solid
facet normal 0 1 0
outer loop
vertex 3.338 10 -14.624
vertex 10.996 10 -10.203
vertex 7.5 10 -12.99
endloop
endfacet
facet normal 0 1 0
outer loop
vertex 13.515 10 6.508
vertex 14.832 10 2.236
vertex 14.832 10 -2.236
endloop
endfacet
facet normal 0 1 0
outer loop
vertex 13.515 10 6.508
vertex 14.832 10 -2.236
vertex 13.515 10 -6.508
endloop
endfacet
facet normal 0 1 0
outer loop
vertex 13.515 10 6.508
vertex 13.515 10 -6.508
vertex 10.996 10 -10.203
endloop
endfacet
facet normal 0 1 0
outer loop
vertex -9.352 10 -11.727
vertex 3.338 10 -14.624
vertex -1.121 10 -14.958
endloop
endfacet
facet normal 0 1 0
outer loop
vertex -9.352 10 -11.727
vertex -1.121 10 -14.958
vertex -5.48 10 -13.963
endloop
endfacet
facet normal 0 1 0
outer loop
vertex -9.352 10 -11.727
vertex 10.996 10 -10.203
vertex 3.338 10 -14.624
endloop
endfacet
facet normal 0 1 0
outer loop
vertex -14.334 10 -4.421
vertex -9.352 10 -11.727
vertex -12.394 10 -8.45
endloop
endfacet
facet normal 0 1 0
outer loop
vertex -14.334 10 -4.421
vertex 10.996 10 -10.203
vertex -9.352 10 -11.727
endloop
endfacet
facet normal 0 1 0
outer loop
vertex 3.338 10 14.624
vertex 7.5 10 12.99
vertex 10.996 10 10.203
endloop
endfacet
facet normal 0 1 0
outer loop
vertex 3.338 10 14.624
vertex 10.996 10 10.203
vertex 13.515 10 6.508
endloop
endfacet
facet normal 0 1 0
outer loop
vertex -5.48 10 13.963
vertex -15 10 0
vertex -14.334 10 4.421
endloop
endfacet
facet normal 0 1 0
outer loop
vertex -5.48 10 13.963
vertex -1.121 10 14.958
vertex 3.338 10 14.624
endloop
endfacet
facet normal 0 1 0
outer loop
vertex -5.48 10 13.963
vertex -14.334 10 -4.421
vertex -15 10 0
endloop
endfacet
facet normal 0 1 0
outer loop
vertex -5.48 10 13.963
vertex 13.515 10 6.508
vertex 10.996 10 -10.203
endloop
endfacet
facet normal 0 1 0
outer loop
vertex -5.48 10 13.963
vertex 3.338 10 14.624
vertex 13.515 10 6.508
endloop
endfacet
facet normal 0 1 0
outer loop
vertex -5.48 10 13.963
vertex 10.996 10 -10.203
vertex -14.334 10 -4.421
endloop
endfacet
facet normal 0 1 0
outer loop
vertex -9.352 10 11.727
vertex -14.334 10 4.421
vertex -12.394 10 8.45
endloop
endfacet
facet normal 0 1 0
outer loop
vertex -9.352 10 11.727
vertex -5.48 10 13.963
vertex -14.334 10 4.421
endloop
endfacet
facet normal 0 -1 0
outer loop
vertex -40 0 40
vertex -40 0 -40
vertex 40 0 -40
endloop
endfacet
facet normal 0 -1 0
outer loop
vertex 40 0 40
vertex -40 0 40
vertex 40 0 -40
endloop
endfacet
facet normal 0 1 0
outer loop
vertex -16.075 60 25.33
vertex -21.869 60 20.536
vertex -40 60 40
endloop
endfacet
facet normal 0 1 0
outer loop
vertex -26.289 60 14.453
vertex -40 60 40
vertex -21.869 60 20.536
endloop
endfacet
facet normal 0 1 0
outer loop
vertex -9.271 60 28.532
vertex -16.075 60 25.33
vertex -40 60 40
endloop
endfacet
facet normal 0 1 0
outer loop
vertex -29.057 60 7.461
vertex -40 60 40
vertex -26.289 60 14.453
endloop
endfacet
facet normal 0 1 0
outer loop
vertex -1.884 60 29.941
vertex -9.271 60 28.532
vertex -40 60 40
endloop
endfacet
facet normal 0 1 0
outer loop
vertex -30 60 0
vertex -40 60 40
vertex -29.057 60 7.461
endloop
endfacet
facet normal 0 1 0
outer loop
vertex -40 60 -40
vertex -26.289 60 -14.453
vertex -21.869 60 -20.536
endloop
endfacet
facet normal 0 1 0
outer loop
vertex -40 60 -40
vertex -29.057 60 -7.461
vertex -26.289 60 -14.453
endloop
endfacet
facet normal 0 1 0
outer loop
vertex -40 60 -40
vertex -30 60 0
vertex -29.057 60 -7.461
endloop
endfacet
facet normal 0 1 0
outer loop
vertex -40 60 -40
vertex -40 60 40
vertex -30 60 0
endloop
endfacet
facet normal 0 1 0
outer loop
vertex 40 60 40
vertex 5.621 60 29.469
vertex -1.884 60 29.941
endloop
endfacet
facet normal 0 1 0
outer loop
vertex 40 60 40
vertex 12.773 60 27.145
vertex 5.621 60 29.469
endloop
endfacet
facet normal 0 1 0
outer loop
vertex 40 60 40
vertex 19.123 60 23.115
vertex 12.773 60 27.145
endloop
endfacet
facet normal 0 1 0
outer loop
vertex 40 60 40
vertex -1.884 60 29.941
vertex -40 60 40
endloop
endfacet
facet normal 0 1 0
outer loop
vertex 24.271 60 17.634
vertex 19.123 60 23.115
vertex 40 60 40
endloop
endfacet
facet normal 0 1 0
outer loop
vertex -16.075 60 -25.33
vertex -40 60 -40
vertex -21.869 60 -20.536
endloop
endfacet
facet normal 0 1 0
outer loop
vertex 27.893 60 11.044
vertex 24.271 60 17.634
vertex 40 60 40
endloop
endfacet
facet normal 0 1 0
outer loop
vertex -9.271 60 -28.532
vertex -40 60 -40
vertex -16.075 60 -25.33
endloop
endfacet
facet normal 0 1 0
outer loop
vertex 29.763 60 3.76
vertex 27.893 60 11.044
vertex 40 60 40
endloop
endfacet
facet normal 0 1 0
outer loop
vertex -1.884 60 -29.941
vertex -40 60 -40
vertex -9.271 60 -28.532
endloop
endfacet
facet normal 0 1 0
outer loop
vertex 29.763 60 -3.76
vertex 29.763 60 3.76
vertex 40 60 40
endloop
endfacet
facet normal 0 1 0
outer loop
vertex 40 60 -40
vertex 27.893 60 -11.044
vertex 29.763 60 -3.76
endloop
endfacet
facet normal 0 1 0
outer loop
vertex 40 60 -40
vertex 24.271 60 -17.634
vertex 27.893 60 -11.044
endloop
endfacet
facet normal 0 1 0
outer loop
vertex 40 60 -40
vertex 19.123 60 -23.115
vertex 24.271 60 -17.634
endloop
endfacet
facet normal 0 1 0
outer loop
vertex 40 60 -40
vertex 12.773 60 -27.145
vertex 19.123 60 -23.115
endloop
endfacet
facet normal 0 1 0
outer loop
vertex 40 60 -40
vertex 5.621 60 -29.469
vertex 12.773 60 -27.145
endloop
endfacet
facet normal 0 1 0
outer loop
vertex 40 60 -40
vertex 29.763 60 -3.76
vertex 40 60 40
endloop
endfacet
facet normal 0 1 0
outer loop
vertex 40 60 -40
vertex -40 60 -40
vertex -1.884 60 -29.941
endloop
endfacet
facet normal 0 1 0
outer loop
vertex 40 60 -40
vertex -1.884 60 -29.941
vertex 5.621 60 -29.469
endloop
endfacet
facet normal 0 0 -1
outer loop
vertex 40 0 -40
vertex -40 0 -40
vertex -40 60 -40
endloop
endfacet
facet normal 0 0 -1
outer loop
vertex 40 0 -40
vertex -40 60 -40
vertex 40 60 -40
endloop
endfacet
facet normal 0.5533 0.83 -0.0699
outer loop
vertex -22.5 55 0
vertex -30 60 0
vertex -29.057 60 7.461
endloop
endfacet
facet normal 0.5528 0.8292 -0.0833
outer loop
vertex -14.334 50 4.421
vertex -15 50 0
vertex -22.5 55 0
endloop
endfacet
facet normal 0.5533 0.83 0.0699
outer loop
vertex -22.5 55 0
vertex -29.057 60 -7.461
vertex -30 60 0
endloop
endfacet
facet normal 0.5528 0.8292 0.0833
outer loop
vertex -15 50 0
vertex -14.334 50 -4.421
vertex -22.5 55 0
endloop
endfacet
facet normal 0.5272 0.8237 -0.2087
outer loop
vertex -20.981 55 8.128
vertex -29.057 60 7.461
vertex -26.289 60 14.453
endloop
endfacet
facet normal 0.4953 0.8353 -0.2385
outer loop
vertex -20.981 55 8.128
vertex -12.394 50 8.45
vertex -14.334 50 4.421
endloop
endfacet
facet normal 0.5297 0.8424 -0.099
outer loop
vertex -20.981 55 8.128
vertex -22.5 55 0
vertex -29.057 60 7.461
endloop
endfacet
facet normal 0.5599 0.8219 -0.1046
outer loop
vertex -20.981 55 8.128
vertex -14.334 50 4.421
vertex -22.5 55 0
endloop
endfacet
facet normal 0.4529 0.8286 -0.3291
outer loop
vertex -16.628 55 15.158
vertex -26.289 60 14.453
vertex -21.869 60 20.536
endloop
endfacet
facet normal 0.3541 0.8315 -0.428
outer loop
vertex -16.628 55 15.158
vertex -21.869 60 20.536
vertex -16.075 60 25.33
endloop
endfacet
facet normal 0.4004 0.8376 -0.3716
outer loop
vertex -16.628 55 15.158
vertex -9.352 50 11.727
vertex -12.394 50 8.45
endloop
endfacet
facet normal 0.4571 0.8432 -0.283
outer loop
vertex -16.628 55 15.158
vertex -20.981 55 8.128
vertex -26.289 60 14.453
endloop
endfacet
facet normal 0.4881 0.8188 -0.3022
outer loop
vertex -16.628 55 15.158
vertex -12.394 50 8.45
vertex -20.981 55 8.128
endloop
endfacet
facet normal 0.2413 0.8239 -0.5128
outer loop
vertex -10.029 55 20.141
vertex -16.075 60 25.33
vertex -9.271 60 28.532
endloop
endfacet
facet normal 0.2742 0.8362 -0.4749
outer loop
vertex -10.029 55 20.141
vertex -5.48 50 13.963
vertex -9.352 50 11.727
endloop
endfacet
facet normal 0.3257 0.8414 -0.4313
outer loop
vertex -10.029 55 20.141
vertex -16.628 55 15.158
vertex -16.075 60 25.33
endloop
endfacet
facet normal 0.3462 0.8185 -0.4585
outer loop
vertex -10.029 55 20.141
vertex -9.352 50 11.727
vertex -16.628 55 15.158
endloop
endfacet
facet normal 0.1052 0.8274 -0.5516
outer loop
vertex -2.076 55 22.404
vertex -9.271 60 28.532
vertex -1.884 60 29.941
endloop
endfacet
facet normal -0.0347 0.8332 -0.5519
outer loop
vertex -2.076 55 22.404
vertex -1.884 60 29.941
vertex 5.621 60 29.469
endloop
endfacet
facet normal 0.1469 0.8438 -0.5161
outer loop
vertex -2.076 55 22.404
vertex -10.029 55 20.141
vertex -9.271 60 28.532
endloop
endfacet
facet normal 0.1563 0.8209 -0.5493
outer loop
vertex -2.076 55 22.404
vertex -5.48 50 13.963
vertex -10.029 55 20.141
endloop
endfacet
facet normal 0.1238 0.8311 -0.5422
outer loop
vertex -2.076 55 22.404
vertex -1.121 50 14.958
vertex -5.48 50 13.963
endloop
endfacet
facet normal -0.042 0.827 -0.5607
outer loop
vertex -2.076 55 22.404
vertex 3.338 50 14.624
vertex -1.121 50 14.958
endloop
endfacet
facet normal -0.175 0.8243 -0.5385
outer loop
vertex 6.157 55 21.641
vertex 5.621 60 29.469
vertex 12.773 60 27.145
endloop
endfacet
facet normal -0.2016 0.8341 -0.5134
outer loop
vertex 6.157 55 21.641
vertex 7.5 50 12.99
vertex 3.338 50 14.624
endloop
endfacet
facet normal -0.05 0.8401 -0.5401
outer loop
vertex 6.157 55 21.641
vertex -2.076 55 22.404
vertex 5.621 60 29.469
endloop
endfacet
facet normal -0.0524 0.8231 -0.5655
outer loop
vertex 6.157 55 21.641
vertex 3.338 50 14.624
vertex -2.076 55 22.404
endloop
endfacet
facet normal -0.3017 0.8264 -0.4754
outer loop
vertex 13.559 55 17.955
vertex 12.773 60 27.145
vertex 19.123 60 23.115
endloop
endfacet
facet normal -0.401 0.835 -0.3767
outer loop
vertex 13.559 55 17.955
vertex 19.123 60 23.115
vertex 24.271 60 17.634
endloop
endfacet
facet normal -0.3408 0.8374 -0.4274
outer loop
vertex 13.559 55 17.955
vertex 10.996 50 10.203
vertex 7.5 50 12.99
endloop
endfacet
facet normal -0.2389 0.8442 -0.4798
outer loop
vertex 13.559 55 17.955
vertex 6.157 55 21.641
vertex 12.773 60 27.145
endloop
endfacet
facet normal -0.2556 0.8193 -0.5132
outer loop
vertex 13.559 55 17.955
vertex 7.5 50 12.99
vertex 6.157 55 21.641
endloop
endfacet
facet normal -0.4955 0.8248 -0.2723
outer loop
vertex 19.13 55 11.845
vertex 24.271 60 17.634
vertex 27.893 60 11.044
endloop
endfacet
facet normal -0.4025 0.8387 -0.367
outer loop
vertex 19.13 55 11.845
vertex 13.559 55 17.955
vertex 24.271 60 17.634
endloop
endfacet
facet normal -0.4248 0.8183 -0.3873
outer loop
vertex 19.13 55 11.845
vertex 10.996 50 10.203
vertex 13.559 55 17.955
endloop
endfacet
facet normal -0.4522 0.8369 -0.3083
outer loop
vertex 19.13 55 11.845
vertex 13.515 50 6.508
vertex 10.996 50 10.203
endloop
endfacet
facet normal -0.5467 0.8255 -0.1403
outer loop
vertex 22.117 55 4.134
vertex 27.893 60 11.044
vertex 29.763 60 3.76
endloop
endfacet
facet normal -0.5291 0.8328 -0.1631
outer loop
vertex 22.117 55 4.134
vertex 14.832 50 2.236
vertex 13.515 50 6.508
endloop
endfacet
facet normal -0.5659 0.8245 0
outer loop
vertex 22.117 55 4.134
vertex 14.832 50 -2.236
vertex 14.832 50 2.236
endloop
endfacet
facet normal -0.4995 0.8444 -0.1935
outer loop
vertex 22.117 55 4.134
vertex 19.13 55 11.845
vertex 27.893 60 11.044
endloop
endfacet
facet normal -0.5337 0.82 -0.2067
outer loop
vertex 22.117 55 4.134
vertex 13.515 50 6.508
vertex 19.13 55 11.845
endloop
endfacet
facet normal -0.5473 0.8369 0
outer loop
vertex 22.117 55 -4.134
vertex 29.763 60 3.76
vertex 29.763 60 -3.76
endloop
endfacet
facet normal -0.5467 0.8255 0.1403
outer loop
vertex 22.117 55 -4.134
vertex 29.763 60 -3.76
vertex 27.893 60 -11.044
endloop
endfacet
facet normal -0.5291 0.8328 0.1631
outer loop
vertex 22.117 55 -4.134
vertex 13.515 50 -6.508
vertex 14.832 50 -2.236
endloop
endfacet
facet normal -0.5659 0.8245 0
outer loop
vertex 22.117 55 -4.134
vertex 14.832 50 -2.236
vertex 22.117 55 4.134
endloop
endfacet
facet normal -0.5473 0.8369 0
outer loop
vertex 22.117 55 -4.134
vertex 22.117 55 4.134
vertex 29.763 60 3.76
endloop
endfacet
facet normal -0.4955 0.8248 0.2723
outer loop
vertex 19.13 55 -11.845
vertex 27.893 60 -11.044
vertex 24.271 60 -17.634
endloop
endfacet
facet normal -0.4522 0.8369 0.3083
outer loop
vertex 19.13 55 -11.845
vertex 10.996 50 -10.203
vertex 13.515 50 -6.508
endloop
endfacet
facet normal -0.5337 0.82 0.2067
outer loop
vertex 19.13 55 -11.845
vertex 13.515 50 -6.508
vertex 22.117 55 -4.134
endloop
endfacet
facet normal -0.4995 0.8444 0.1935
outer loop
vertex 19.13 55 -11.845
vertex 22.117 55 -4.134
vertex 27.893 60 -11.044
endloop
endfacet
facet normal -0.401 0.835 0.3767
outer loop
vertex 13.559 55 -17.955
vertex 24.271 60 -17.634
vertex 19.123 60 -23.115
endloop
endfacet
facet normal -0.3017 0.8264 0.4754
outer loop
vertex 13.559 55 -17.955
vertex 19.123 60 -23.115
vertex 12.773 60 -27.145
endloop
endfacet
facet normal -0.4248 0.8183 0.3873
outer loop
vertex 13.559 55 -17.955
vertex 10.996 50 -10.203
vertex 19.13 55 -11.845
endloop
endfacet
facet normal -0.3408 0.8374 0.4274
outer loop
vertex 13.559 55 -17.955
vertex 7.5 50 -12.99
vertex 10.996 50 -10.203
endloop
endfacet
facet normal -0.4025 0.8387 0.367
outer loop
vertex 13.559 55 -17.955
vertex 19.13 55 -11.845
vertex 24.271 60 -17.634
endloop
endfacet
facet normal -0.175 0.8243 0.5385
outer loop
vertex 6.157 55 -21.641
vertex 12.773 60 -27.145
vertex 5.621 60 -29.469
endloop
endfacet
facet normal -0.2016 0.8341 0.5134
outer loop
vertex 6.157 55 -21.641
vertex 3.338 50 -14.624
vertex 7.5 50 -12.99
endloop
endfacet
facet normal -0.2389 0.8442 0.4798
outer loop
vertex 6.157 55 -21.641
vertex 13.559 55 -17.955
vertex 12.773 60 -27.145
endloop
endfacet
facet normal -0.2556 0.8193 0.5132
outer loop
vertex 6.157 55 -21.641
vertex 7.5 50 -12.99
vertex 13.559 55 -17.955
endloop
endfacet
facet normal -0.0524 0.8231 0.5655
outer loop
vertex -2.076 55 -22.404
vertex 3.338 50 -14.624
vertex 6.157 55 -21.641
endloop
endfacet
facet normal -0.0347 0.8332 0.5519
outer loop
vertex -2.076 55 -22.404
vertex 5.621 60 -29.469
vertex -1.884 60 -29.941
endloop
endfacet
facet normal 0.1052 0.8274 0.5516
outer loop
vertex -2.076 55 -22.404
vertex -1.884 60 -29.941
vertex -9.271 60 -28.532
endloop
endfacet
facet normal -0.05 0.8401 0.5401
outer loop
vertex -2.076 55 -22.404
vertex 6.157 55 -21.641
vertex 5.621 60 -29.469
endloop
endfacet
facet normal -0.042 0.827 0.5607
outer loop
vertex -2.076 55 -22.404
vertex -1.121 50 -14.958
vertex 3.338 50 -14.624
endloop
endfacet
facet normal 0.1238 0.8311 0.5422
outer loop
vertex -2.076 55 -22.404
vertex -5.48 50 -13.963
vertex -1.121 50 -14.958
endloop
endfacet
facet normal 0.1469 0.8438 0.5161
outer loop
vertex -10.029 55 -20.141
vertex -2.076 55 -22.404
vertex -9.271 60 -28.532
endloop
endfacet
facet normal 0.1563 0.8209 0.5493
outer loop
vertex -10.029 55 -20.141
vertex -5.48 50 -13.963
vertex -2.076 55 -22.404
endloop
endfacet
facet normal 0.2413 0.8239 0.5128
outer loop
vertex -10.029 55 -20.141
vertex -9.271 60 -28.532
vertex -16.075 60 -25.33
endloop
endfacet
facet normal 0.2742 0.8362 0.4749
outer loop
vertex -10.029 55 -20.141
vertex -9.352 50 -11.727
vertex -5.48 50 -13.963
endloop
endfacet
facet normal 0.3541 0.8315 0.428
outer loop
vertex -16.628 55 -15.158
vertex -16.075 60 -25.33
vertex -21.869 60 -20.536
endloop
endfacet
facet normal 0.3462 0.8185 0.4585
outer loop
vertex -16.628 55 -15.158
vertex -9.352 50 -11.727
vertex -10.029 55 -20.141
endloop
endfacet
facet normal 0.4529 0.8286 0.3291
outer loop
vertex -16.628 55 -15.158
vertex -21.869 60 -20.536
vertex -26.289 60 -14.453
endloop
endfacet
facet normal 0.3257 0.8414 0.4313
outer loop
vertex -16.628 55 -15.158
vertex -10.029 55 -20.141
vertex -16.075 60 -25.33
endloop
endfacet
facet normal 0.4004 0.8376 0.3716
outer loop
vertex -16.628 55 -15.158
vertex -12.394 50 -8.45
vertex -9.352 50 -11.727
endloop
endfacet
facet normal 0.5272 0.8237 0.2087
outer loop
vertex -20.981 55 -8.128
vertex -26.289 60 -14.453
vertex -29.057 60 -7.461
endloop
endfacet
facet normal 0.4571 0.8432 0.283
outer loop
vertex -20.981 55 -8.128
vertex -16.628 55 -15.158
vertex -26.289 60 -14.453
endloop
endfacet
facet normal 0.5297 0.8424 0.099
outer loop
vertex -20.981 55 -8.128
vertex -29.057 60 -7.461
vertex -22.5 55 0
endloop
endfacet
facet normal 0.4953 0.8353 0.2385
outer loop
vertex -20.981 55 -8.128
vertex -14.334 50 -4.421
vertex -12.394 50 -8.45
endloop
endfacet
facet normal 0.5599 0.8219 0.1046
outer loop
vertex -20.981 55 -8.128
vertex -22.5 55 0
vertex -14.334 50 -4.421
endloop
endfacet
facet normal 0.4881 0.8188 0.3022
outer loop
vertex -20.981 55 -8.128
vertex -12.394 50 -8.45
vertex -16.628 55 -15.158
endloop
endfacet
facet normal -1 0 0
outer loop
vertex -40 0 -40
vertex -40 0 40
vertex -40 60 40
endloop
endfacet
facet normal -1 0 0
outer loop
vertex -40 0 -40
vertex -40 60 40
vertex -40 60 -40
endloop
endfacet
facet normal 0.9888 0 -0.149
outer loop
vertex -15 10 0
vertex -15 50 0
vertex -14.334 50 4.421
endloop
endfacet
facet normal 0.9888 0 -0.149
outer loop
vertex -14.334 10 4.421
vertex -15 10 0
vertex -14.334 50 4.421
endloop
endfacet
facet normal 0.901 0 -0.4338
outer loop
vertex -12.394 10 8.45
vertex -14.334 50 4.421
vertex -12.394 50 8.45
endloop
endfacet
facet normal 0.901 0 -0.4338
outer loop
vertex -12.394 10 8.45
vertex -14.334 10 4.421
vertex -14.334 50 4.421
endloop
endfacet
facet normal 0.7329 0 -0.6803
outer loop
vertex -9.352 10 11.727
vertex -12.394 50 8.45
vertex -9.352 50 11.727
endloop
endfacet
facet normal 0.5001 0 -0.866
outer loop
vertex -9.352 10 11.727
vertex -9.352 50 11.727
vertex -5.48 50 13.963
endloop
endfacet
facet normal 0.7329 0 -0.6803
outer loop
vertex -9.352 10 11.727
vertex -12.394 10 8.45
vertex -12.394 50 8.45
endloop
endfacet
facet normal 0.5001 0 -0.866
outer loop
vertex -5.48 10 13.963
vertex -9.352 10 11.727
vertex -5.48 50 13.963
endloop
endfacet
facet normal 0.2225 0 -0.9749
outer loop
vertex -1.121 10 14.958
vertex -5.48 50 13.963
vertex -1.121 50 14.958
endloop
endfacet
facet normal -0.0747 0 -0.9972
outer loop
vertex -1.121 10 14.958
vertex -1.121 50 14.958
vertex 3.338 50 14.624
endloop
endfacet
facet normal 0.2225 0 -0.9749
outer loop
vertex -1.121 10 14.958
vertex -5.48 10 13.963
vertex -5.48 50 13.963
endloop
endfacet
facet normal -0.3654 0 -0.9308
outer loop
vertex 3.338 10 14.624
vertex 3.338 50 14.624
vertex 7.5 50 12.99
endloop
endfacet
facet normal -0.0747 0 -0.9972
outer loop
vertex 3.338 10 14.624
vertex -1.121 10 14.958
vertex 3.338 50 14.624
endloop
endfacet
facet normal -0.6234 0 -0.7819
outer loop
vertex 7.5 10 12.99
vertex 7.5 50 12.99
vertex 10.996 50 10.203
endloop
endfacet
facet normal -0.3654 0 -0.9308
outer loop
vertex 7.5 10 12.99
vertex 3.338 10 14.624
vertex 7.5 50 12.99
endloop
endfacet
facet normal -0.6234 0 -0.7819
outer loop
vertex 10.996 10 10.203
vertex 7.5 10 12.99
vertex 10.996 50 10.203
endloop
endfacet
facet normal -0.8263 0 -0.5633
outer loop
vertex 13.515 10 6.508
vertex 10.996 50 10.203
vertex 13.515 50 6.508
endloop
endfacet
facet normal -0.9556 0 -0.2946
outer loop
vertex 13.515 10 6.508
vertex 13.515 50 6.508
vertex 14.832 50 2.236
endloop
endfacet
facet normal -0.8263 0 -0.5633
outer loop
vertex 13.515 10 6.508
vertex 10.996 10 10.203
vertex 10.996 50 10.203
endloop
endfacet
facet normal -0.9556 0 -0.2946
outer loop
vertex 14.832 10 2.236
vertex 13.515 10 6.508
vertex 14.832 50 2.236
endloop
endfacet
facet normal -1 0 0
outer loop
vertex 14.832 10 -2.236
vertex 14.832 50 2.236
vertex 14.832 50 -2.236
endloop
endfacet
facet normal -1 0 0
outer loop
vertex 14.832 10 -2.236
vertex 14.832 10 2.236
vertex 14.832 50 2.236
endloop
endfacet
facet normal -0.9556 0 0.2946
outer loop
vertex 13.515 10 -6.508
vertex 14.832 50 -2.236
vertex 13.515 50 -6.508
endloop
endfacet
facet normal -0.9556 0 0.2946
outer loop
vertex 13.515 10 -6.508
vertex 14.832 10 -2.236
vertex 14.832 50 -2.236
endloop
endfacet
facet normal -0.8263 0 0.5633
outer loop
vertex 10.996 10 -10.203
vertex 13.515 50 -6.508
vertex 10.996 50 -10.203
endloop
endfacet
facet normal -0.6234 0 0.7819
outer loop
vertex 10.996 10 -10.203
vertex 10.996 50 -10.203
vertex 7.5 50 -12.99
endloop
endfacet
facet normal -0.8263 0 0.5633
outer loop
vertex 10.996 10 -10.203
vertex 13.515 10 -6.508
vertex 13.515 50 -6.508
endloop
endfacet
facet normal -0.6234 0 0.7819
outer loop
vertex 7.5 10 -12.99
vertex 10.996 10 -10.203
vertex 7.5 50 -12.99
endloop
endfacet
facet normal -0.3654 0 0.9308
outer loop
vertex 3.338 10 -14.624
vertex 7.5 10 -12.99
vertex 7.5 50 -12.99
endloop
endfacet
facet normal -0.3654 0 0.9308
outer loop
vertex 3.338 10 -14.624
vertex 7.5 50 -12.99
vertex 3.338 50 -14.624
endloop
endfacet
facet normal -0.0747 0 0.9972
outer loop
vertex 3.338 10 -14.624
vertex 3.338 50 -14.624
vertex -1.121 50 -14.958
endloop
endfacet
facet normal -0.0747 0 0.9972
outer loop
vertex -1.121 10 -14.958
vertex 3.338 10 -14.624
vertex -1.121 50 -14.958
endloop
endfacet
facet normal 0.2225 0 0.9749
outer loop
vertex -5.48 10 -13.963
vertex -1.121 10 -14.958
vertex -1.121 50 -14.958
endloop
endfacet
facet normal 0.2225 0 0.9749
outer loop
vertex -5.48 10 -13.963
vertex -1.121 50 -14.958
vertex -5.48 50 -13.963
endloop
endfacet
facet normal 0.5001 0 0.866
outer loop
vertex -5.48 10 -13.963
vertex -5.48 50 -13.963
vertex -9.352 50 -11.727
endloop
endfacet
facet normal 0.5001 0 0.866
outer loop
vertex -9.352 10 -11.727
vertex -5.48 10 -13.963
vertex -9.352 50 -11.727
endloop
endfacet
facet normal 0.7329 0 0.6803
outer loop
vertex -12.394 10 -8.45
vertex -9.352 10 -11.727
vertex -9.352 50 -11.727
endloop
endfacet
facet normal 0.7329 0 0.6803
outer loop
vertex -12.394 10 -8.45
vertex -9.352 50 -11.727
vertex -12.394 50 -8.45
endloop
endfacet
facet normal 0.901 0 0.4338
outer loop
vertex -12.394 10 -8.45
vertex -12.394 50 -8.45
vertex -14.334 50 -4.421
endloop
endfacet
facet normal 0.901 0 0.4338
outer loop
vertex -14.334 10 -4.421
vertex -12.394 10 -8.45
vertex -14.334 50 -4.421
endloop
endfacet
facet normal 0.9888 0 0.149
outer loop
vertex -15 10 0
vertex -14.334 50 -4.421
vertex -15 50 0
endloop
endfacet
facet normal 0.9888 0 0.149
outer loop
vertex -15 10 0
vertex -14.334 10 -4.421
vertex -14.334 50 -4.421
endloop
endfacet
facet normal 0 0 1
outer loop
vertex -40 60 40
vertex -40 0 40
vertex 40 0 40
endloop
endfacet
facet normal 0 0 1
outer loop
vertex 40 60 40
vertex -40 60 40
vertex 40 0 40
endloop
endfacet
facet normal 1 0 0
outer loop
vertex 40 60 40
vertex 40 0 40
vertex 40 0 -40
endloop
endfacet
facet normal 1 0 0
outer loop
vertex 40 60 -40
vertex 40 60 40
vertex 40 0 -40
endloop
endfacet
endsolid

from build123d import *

# Parameters (mm, degrees)
SKETCH1_W           = 80
SKETCH1_H           = 80
BOSS_EXTRUDE1_DEPTH = 60


with BuildPart() as part:
    # Sketch1 → Boss-Extrude1 (new body)
    with BuildSketch(Plane(origin=(0, 0, 0), x_dir=(1, 0, 0), z_dir=(0, 1, 0))):
        Rectangle(SKETCH1_W, SKETCH1_H)
    extrude(amount=BOSS_EXTRUDE1_DEPTH)

    # Sketch2 → Cut-Revolve1 (revolve, cut)
    with BuildSketch(Plane.XY):
        Polygon((0, 60), (-30, 60), (-15, 50), (-15, 10), (0, 10), align=None)
    revolve(axis=Axis((0, 10, 0), (0, 1, 0)), mode=Mode.SUBTRACT)


solid = part.part
